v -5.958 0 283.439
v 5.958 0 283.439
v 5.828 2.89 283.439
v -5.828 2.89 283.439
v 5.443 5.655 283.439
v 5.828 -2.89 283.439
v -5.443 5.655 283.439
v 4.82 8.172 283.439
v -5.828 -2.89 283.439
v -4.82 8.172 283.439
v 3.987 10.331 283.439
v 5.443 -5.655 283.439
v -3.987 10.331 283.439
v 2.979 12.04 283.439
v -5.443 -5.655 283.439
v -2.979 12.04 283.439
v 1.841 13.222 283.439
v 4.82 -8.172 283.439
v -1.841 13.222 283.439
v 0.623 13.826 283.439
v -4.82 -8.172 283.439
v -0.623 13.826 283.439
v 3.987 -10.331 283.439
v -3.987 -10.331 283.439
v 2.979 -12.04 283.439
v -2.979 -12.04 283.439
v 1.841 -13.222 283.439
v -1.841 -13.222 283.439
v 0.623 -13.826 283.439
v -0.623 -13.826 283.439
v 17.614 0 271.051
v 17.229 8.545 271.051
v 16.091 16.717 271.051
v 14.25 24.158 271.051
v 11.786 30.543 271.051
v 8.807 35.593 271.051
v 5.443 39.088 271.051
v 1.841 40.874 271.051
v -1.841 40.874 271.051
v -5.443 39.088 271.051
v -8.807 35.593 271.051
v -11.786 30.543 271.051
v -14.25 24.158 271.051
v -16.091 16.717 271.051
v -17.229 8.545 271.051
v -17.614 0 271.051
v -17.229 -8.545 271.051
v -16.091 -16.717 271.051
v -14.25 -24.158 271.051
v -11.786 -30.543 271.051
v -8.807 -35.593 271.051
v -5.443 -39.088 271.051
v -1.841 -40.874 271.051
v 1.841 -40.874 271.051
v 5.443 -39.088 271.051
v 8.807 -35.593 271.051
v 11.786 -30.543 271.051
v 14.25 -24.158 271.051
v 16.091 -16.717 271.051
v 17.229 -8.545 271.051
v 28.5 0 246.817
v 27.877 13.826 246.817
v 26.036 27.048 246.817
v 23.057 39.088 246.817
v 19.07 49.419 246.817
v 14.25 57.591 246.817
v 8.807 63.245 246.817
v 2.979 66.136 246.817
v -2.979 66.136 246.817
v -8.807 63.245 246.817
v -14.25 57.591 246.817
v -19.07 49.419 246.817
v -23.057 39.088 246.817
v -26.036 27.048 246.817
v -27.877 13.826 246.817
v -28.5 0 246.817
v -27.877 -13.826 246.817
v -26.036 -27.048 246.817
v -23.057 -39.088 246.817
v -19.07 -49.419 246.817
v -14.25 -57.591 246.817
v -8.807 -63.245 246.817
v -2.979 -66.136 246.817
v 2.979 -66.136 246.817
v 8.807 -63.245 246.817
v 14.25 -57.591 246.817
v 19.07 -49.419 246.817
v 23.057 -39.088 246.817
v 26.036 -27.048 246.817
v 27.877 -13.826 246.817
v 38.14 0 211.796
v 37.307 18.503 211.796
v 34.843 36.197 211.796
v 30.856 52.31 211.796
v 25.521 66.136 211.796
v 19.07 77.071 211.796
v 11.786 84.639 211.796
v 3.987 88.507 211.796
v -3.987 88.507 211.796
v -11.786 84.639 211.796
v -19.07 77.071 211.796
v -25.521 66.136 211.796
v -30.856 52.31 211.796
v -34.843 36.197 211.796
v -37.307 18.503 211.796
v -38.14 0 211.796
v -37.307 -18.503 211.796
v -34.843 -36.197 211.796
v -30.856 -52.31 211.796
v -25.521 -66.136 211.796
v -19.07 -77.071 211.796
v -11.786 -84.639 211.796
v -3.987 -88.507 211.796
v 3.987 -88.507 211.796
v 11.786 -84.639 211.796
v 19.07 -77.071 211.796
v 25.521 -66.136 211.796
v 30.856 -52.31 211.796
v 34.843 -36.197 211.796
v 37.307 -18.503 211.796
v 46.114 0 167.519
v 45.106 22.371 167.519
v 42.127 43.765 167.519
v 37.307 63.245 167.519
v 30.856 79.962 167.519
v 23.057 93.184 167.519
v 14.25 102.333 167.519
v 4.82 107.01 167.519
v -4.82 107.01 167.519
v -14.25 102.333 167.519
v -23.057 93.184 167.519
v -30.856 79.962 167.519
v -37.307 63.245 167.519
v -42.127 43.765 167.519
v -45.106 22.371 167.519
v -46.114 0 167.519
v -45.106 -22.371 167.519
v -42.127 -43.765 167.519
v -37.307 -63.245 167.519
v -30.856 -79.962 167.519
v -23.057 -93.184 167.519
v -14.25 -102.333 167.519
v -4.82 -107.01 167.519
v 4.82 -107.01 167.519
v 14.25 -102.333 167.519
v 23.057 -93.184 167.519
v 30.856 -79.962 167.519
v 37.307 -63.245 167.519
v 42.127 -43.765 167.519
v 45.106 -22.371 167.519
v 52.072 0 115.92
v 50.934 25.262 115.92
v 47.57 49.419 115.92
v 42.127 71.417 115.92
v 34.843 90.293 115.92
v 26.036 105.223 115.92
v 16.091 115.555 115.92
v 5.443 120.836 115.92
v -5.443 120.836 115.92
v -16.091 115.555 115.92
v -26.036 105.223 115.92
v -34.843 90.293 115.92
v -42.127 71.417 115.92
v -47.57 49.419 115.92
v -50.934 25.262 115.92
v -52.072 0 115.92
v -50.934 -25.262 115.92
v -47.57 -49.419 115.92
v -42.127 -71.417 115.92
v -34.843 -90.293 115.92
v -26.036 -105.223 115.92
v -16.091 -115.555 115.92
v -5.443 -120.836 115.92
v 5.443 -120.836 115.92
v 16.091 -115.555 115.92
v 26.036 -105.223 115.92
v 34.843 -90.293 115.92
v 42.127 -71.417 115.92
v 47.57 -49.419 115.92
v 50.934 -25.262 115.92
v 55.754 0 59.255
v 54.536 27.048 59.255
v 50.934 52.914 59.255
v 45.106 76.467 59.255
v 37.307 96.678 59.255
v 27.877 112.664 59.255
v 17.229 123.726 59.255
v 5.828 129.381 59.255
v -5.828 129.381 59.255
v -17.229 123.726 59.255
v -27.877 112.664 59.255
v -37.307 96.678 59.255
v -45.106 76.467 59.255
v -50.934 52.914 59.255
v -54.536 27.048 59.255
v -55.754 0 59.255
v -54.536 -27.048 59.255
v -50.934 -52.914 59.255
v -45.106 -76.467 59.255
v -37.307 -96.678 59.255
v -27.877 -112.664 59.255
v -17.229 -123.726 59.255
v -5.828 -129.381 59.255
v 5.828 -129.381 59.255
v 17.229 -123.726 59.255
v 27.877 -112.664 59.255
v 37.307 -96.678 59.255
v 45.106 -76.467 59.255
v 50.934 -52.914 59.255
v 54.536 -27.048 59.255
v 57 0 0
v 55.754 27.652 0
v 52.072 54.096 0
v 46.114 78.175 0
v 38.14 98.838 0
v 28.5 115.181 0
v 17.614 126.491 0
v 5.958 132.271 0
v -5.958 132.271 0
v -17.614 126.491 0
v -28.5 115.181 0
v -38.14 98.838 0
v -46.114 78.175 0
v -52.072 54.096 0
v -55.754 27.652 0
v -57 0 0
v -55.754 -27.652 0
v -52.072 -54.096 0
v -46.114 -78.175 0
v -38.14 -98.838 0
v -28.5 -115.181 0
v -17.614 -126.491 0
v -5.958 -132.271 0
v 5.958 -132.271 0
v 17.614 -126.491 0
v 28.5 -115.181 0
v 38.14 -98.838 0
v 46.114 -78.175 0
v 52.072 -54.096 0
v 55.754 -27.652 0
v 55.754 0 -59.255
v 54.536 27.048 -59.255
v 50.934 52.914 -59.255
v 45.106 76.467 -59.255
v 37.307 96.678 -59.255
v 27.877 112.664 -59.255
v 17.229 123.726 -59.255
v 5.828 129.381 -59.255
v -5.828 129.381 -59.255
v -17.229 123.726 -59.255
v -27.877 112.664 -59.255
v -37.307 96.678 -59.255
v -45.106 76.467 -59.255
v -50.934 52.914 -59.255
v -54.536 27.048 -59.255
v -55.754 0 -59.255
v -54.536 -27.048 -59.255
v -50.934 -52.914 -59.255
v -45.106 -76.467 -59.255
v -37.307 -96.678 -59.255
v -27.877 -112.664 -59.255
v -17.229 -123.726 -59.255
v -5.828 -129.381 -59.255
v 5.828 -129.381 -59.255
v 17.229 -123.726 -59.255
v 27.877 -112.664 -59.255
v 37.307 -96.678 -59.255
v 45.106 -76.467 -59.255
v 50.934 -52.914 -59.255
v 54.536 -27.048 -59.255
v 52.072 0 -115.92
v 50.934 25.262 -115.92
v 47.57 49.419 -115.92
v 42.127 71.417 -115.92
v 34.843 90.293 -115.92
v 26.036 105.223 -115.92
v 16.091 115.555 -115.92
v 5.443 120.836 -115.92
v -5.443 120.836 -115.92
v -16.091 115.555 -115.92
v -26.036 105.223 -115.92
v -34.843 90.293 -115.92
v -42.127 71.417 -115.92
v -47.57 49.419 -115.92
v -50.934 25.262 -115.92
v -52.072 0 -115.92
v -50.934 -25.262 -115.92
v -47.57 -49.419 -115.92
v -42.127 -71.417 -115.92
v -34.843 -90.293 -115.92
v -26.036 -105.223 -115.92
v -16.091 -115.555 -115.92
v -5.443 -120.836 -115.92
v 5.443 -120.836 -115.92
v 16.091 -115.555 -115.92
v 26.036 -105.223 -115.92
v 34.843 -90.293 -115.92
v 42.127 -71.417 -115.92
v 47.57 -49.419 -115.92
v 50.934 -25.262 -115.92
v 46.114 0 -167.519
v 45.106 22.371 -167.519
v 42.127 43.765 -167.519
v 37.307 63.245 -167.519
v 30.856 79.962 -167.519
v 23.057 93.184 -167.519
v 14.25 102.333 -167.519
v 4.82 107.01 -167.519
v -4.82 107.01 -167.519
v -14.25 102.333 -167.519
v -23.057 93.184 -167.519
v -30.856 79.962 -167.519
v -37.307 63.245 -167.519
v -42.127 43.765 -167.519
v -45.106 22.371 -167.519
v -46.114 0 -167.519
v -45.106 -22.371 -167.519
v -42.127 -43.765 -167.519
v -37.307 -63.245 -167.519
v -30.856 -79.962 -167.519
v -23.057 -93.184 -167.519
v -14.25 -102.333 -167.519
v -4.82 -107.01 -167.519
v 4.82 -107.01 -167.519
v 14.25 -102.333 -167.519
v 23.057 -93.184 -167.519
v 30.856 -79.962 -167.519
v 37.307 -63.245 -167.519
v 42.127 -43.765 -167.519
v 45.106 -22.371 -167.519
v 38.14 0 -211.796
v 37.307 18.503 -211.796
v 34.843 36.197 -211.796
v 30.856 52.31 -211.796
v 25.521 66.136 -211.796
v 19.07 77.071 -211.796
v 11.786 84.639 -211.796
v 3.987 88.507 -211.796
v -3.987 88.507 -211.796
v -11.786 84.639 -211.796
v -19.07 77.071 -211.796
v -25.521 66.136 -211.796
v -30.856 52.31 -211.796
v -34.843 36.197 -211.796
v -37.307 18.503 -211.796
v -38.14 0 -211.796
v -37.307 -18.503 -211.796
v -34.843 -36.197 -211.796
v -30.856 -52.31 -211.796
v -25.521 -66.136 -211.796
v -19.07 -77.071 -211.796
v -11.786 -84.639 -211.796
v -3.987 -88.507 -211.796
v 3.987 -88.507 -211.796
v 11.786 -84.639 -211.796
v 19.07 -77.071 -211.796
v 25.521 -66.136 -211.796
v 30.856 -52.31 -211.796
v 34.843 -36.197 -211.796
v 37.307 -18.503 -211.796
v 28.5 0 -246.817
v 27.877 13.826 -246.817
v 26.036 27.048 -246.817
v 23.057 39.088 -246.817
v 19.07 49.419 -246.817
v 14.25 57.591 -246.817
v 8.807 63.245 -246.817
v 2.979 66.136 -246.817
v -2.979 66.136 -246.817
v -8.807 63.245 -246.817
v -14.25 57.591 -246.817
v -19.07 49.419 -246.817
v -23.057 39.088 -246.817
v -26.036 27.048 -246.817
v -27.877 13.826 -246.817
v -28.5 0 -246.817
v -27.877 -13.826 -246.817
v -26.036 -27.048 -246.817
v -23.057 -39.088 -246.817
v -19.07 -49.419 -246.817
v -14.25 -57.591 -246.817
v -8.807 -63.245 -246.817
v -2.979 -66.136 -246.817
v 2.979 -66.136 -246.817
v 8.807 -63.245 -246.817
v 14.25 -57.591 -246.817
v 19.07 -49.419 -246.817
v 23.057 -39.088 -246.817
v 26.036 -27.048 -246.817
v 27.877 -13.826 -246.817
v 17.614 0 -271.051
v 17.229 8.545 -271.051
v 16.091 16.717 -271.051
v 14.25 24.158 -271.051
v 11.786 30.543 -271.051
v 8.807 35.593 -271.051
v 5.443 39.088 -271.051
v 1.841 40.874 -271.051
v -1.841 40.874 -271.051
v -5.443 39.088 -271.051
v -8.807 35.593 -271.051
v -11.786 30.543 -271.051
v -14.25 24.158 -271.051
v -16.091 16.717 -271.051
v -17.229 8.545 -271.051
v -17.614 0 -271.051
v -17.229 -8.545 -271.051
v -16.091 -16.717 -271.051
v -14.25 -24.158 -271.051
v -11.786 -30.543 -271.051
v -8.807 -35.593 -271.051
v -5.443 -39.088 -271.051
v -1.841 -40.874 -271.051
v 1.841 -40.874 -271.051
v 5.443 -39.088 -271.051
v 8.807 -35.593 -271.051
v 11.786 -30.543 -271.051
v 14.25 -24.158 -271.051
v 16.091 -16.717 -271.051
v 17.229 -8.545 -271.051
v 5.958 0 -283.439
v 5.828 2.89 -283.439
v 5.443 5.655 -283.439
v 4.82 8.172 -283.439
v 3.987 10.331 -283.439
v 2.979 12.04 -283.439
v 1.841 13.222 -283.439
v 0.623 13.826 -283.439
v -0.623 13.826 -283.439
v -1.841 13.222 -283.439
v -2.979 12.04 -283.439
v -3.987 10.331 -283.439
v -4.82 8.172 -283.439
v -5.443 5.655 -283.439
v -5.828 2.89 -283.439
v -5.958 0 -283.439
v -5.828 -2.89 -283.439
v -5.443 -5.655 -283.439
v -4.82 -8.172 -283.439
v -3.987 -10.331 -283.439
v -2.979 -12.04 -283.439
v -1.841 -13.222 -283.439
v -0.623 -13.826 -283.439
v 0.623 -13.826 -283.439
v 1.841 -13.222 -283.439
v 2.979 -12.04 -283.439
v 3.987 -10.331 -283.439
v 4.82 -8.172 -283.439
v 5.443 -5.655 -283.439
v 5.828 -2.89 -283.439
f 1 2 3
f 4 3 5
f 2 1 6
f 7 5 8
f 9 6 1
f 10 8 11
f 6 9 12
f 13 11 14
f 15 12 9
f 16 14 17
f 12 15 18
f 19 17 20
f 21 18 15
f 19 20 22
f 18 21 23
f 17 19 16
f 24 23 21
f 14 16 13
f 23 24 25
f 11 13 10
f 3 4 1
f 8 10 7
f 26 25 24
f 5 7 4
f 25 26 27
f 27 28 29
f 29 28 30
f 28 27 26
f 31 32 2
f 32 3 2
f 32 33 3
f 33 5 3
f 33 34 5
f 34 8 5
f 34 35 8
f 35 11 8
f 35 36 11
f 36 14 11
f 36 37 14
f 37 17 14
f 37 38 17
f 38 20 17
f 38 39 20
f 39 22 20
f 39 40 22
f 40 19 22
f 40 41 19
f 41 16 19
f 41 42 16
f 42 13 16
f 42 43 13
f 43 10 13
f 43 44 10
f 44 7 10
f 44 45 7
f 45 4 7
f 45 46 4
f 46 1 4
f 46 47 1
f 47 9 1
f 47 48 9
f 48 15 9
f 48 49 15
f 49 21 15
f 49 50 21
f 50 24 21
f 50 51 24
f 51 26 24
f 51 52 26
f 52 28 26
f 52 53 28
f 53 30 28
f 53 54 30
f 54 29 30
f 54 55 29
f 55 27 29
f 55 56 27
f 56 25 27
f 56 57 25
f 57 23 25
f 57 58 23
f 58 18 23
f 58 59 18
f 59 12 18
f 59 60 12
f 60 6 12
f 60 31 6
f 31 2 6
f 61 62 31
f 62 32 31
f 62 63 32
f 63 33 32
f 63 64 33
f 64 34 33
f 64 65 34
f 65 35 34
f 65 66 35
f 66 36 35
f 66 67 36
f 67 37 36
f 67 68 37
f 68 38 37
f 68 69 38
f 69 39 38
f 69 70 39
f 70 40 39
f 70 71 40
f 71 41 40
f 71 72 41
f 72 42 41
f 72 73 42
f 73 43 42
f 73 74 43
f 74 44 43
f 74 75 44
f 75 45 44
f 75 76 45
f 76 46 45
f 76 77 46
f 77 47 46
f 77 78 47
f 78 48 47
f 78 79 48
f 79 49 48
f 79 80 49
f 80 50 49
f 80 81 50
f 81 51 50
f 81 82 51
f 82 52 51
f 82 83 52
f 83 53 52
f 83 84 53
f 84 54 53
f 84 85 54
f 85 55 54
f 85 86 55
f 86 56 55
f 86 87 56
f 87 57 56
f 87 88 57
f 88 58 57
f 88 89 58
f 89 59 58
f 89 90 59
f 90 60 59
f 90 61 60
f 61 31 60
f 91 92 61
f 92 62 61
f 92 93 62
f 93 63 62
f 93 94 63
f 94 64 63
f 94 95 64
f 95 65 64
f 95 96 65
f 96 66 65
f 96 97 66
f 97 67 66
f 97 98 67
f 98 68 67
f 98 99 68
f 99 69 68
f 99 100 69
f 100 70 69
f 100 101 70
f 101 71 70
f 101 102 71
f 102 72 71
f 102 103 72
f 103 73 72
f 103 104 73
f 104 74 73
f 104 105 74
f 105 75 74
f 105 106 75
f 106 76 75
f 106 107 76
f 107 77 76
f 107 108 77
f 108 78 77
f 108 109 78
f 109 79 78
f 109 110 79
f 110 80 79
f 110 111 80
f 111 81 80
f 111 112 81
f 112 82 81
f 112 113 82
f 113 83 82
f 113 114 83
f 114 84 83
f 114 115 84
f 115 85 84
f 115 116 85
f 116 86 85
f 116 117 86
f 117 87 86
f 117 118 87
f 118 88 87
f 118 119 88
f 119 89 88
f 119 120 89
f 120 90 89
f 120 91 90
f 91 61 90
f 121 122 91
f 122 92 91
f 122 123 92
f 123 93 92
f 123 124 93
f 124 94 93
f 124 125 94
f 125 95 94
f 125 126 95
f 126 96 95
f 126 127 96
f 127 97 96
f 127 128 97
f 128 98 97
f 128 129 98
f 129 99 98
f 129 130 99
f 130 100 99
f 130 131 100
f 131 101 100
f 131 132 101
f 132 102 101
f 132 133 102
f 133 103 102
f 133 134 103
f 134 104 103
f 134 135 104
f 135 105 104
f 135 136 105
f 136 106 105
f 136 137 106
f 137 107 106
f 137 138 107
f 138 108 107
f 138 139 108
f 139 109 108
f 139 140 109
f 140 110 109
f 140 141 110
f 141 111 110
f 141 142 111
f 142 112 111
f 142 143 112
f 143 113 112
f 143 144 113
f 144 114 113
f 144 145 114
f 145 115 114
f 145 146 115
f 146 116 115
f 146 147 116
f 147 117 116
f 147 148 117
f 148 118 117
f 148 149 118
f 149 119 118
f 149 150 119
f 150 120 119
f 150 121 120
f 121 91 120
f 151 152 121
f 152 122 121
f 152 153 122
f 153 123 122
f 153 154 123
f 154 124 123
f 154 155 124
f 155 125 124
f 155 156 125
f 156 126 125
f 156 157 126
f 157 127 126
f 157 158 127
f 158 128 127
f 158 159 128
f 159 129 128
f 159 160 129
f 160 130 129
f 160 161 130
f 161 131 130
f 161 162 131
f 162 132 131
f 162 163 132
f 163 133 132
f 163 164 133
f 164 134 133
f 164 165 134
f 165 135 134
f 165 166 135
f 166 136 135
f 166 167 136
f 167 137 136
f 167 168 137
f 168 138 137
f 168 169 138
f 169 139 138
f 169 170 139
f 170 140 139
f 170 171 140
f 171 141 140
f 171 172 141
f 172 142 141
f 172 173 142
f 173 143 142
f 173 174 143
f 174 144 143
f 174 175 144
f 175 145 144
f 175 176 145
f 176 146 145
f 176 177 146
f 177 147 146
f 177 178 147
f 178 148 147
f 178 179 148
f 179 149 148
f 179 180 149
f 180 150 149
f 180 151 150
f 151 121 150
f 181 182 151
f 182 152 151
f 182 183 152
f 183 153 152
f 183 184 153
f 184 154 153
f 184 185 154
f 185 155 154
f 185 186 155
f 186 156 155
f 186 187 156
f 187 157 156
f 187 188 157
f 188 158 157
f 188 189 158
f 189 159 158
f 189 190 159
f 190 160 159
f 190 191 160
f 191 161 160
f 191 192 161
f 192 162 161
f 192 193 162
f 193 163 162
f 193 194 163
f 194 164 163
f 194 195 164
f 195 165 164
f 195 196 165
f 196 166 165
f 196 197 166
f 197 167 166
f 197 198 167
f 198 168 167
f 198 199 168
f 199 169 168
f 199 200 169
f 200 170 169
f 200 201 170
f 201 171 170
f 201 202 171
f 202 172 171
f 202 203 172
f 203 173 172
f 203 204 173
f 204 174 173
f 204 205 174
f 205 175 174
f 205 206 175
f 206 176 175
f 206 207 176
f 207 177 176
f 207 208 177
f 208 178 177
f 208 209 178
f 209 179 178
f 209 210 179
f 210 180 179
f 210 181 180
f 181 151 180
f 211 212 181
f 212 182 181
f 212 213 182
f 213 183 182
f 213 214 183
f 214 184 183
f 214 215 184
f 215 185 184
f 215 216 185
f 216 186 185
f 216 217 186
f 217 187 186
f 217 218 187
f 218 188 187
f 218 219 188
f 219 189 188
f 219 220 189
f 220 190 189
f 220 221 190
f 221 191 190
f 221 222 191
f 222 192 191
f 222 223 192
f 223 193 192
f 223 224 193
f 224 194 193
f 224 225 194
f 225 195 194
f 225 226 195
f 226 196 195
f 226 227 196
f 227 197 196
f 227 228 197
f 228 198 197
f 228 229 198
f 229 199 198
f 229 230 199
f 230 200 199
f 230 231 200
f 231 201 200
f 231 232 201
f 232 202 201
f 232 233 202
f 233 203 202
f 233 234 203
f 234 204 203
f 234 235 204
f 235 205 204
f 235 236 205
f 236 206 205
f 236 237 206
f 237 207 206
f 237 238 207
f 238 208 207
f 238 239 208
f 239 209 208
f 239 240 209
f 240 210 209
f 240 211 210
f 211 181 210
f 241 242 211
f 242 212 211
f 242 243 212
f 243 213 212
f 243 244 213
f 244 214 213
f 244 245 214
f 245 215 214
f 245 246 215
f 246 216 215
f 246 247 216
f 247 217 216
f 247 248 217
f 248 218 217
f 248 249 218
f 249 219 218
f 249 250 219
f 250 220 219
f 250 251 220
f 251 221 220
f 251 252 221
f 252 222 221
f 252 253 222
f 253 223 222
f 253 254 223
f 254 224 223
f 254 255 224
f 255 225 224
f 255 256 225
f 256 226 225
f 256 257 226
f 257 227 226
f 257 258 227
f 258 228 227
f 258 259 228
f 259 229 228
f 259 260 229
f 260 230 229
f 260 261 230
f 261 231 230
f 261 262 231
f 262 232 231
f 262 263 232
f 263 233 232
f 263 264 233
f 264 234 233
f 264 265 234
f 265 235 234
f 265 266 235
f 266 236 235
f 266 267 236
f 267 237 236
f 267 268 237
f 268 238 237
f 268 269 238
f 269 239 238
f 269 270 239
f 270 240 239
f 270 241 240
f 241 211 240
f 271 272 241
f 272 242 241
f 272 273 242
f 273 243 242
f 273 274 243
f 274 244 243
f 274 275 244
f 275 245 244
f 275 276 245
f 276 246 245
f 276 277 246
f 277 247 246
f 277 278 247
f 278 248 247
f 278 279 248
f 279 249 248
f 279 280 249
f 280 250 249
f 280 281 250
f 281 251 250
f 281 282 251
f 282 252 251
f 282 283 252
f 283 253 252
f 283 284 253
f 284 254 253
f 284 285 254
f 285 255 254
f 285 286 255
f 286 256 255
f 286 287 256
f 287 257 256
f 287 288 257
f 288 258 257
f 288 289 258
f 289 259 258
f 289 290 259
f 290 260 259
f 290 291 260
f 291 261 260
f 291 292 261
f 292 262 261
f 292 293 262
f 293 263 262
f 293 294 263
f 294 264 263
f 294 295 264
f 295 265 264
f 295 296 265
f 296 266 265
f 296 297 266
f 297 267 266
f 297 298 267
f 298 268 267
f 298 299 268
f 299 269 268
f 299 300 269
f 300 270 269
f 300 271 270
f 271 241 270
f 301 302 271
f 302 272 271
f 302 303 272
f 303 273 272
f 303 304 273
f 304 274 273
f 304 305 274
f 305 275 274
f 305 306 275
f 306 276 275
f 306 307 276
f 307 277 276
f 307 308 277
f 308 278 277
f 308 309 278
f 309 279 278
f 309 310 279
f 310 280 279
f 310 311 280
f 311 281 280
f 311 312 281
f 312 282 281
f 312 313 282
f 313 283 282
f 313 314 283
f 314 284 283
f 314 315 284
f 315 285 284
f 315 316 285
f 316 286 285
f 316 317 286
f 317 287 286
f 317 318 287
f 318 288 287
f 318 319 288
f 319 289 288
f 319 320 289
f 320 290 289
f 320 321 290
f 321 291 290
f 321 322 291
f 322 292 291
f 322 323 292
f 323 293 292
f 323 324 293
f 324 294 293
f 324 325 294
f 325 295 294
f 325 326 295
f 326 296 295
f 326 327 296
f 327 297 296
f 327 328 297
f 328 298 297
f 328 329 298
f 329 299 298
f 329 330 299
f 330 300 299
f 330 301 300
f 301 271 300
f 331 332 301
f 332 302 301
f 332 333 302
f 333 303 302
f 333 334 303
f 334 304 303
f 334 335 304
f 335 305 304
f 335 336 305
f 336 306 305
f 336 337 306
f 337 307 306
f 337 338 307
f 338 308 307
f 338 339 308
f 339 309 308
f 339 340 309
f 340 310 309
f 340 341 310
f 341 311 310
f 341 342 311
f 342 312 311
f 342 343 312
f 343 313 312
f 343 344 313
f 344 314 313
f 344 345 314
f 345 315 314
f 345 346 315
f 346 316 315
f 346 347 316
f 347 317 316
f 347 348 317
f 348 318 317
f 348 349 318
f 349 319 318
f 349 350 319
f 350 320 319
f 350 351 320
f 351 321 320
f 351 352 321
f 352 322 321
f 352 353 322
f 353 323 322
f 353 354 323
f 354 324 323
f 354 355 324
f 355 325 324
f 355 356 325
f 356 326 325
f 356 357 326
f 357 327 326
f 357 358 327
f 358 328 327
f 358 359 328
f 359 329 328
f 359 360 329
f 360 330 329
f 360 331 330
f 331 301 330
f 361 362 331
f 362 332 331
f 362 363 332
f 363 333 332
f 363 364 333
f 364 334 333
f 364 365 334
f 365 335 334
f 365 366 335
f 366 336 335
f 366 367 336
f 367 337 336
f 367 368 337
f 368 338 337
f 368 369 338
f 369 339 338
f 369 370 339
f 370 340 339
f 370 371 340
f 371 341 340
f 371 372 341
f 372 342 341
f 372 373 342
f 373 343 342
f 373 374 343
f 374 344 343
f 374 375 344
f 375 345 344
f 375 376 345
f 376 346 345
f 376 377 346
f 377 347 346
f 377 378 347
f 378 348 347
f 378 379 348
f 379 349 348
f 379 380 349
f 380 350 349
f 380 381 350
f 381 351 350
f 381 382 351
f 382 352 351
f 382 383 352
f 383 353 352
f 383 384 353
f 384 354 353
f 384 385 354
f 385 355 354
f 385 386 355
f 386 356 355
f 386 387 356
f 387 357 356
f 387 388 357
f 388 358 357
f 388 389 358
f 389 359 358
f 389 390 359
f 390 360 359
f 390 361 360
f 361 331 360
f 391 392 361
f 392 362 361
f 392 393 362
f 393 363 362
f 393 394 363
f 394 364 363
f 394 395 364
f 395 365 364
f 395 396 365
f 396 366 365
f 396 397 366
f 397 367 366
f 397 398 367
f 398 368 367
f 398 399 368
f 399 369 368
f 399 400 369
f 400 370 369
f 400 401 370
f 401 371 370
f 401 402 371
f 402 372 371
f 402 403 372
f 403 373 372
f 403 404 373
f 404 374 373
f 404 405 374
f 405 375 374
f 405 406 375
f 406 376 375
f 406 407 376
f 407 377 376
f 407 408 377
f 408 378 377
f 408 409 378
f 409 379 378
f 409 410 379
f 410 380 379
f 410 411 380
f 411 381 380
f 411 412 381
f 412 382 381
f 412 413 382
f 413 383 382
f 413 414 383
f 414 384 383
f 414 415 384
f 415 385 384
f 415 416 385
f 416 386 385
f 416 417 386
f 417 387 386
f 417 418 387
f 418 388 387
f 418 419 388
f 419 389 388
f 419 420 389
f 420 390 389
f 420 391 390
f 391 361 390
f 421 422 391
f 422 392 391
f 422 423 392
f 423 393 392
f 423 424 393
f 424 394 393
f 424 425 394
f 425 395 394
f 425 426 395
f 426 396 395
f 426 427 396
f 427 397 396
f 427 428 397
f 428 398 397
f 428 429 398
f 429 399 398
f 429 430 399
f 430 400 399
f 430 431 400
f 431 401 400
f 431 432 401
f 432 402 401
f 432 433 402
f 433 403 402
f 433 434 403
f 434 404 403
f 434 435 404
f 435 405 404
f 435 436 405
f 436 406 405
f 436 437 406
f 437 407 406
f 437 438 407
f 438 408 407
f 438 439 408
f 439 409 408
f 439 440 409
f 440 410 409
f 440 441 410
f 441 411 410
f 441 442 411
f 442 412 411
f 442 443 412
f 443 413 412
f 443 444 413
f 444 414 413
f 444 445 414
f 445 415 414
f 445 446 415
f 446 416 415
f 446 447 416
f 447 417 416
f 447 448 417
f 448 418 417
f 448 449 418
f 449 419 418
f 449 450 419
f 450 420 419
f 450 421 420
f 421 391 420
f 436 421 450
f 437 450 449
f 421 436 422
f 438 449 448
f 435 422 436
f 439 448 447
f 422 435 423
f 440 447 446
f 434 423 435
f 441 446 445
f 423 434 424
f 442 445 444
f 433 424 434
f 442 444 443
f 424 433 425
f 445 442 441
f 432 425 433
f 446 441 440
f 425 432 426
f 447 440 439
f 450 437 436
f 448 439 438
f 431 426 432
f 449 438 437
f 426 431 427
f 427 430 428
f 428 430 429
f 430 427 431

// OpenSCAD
// Generated by SolidPython 1.0.1 on 2020-07-29 00:39:25


scale(v = [3, 7, 15]) {
	sphere(r = 19);
}
/***********************************************
*********      SolidPython code:      **********
************************************************
 
# import packages: SolidPython
from solid import *
from solid.utils import *
from itertools import chain, combinations


class Resize:

    def __init__(self, scad_file):
        self.scad_file = scad_file
        #self.scad_file = import_scad(scad_file)
        # cone/cylinder param:
        self.r1 = 0
        self.r2 = 0
        self.h = 0
        # rectangular prism param:
        self.w = 0
        self.l = 0
        # ellipse param:
        self.r = 0

    # import OpenScad code (file name corresponds to shape)


    # classify shape + parameters
    def assign(self, param1, param2, param3):
        if self.scad_file == 'cone.scad':
            self.r1 = param1
            self.r2 = param2
            self.h = param3
        elif self.scad_file == 'cylinder.scad':
            self.r1 = param1
            self.r2 = param2
            self.h = param3
        elif self.scad_file == 'rectangularPrism.scad':
            self.h = param1
            self.l = param2
            self.w = param3
        else:
            self.r = param1
            self.h = param2

    # resize parameters
    def iterate(self):
        x = range(3, 20, 2)
        i = 1
        if self.scad_file == 'cone.scad':
            tempList = list(combinations(x, 2))
            for temp in tempList:
                param1 = temp[0]
                param2 = temp[1]
                filepath = 'produced_scad_files/' + 'cone' + str(param1) + '_' + str(param2) + '_' + '.scad'
                scad_render_to_file(cylinder(h=param1, r1=param2, r2=0), filepath)

        elif self.scad_file == 'cylinder.scad':
            tempList = list(combinations(x, 3))
            for temp in tempList:
                param1 = temp[0]
                param2 = temp[1]
                filepath = 'produced_scad_files/' + 'cylinder' + str(param1) + '_' + str(param2) + '_' + '.scad'
                scad_render_to_file(cylinder(h=param1, r1=param2, r2=param2), filepath)

        elif self.scad_file == 'rectangularPrism.scad':
            tempList = list(combinations(x, 3))
            for temp in tempList:
                param1 = temp[0]
                param2 = temp[1]
                param3 = temp[2]
                filepath = 'produced_scad_files/' + 'rectangularPrism' + str(param1) + '_' + str(param2) + '_' + str(
                    param3) + '.scad'
                scad_render_to_file(cube(size=(param1, param2, param3)), filepath)

        elif self.scad_file == 'ellipse.scad':
            tempList = list(combinations(x, 4))
            for temp in tempList:
                param1 = temp[0]
                param2 = temp[1]
                param3 = temp[2]
                param4 = temp[3]
                filepath = 'produced_scad_files/' + 'ellipse' + str(param1) + '_' + str(param2) + '_' + str(param3) + '_' + str(param4) + '.scad'
                scad_render_to_file(scale([param1, param2, param3])(sphere(r=param4)), filepath)

    def render_to_scadfile(self):
        scad_render_to_file(scad, 'example.scad') 
 
************************************************/
